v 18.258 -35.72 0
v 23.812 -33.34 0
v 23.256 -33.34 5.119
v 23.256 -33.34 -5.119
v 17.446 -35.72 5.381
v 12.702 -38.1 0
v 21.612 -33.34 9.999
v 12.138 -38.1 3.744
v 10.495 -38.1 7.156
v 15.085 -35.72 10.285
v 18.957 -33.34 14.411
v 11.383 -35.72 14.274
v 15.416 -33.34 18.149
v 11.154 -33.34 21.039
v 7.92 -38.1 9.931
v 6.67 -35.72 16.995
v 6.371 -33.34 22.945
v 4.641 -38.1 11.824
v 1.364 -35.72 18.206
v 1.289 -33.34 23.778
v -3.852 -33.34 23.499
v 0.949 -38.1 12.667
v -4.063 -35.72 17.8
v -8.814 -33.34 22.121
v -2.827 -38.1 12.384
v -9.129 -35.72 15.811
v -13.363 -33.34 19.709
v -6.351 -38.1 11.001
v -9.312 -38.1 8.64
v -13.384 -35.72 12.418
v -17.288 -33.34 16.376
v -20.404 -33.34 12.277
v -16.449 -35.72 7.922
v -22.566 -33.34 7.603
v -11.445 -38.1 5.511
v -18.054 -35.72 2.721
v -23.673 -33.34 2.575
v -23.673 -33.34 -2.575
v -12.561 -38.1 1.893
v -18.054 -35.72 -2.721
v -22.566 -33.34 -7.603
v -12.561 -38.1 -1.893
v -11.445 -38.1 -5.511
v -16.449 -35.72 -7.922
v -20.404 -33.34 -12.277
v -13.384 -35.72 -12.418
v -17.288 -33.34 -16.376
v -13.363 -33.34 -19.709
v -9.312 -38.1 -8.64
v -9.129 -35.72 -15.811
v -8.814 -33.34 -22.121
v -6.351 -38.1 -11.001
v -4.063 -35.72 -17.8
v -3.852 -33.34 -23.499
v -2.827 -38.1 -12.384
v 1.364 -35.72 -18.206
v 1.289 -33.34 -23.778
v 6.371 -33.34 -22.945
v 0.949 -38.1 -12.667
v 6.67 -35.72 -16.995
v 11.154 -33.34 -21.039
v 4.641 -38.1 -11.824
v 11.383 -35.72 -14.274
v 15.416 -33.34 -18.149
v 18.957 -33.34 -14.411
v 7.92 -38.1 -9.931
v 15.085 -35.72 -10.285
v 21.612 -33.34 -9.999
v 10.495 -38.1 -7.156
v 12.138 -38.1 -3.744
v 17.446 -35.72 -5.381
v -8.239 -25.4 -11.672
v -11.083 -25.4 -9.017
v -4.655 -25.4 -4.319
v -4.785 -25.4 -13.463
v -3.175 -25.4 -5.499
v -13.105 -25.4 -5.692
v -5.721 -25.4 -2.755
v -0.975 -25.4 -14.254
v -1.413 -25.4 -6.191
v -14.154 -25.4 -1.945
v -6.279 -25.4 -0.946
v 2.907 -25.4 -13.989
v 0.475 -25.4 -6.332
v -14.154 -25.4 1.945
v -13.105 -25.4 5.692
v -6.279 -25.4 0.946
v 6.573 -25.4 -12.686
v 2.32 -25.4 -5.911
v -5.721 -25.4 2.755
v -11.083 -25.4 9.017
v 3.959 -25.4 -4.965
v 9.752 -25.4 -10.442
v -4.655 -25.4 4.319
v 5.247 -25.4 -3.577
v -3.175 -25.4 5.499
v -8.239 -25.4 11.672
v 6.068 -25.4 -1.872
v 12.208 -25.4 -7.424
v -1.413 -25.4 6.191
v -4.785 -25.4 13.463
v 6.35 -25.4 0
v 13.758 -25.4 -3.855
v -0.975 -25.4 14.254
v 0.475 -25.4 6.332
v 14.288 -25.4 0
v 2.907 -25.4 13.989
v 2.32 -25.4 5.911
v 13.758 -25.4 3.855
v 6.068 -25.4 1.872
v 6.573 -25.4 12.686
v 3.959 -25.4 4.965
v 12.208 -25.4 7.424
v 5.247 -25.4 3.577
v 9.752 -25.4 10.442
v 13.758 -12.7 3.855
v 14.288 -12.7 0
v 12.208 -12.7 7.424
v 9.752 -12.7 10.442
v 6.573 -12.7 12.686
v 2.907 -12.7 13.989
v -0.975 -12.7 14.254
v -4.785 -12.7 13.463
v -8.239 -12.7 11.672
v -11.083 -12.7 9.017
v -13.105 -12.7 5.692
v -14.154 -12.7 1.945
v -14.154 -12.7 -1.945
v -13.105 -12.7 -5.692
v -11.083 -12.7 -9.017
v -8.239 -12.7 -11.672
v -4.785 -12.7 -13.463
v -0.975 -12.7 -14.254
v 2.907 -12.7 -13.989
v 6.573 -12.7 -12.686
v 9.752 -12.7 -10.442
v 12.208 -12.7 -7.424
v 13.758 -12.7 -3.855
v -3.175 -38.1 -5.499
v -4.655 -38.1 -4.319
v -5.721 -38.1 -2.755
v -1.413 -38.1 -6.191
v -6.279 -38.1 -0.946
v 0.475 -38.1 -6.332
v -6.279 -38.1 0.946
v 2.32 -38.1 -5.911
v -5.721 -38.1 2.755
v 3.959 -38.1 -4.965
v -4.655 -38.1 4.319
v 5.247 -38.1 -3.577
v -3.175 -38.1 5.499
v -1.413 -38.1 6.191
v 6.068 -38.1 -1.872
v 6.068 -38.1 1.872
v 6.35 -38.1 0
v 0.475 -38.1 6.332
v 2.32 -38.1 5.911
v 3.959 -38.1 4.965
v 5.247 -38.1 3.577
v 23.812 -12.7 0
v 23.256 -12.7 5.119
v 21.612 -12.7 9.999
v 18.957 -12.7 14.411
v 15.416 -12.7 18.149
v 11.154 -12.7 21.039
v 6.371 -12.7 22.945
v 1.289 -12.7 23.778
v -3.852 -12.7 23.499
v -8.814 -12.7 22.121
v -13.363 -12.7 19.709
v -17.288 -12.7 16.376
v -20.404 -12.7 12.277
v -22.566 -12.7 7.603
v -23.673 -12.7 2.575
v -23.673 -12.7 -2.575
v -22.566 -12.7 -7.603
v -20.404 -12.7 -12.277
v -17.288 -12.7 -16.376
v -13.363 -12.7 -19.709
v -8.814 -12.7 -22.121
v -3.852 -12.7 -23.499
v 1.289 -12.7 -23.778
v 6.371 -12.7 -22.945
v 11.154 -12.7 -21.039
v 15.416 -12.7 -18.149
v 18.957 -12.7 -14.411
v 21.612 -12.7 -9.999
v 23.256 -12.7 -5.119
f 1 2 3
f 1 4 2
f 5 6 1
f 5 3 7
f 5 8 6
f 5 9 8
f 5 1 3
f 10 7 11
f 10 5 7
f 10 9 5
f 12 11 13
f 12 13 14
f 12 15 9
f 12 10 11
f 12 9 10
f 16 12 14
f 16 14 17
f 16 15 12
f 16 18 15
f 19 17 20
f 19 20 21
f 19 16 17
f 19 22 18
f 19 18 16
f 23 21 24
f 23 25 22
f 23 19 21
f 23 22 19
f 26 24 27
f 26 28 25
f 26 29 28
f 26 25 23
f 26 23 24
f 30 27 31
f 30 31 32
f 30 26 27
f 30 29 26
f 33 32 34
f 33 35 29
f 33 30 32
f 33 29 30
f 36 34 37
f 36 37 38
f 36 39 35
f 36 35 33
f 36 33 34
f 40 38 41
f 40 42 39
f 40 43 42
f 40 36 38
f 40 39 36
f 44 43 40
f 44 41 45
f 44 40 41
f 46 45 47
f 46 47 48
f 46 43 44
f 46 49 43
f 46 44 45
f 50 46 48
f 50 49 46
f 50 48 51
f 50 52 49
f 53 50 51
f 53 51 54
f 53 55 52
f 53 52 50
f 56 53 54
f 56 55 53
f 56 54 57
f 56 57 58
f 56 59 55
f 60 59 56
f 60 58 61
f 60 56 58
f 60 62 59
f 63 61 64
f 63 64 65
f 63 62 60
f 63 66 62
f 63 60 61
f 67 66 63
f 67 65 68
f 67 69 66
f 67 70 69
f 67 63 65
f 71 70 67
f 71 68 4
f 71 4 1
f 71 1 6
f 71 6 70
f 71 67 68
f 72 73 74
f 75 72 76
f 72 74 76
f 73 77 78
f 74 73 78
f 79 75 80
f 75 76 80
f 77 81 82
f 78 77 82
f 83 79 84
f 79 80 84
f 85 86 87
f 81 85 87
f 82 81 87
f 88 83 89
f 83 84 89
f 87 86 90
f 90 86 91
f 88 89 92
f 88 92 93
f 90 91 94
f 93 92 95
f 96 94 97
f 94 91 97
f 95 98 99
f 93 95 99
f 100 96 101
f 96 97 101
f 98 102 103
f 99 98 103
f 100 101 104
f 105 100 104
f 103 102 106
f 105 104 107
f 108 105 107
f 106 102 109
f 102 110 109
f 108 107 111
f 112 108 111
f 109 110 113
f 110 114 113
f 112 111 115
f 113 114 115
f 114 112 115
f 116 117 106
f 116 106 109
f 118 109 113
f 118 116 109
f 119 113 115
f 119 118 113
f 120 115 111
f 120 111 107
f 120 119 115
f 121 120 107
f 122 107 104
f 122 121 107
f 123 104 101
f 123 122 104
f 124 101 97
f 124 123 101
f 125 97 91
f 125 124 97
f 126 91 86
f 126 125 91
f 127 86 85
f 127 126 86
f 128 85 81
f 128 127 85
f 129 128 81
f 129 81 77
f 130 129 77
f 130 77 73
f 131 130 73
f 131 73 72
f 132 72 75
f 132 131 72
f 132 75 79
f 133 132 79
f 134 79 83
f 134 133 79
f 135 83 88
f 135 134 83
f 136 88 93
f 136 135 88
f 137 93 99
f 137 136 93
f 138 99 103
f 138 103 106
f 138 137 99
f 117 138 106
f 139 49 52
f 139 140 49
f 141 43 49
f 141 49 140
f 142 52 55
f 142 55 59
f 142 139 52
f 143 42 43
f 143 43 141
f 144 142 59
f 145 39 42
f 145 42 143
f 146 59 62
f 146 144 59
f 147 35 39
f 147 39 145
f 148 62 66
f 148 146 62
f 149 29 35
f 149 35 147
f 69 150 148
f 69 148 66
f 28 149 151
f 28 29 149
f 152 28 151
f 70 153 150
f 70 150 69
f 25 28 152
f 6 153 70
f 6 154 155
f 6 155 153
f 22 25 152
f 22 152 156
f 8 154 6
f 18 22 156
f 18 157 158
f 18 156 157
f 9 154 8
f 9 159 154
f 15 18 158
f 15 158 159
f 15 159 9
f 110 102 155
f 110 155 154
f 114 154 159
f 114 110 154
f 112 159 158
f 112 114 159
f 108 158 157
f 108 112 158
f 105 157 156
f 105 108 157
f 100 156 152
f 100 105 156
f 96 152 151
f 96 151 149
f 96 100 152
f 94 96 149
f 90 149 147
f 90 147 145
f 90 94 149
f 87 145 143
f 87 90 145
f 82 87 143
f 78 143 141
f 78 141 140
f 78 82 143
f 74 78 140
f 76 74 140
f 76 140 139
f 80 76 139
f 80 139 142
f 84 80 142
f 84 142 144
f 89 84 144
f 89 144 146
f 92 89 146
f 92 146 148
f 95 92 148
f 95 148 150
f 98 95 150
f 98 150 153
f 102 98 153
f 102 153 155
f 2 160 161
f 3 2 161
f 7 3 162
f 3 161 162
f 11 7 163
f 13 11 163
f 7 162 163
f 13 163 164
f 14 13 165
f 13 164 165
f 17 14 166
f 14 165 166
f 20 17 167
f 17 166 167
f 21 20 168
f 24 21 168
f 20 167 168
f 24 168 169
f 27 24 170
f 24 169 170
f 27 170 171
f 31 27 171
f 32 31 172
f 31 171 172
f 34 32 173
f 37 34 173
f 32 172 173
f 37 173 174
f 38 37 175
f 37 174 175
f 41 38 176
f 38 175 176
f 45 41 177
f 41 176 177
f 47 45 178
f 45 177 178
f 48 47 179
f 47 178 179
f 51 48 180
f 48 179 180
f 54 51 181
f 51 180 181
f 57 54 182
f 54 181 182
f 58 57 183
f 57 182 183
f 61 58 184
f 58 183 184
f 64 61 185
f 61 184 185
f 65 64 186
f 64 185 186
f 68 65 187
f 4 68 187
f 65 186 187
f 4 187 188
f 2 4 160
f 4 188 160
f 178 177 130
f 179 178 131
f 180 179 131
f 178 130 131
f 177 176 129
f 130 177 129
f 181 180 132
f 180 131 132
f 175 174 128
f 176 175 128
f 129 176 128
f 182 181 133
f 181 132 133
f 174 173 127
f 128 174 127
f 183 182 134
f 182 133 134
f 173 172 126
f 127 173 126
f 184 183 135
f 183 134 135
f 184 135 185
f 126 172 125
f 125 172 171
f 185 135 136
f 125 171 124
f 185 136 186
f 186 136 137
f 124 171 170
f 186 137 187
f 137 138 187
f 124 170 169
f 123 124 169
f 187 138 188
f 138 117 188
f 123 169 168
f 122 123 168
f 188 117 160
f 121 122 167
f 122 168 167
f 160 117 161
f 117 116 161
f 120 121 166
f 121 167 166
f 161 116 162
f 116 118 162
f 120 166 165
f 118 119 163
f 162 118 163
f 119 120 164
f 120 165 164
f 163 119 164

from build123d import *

# Parameters (mm, degrees)
SKETCH050_R      = 14.2875
PAD049_DEPTH     = 12.7
SKETCH049_R      = 23.8125
SKETCH049_R_2    = 6.35
PAD050_DEPTH     = 25.4
CHAMFER003_SIZE2 = 11.11
CHAMFER003_SIZE  = 4.76


with BuildPart() as body048:
    # Sketch050 → Pad049 (new body)
    with BuildSketch(Plane.XZ):
        Circle(SKETCH050_R)
    extrude(amount=PAD049_DEPTH)


with BuildPart() as chamfer003:
    # Sketch049 → Pad050 (new body)
    with BuildSketch(Plane.XZ):
        Circle(SKETCH049_R)
        Circle(SKETCH049_R_2, mode=Mode.SUBTRACT)
    extrude(amount=PAD050_DEPTH)

    # Cut047: cut Body048
    add(body048.part, mode=Mode.SUBTRACT)

    # Chamfer003
    chamfer003_edges = [chamfer003.edges().sort_by_distance(p)[0] for p in [
        (-23.8125, -25.4, 0),
    ]]
    chamfer003_side = chamfer003.faces().sort_by_distance((-23.8125, -12.7, 0))[0]
    chamfer(chamfer003_edges, length=CHAMFER003_SIZE, length2=CHAMFER003_SIZE2, reference=chamfer003_side)


with BuildPart() as chamfer003_1:
    # Chamfer003 placement: moved
    add(chamfer003.part.moved(Location((0, -12.7, 0))))


solid = chamfer003_1.part
